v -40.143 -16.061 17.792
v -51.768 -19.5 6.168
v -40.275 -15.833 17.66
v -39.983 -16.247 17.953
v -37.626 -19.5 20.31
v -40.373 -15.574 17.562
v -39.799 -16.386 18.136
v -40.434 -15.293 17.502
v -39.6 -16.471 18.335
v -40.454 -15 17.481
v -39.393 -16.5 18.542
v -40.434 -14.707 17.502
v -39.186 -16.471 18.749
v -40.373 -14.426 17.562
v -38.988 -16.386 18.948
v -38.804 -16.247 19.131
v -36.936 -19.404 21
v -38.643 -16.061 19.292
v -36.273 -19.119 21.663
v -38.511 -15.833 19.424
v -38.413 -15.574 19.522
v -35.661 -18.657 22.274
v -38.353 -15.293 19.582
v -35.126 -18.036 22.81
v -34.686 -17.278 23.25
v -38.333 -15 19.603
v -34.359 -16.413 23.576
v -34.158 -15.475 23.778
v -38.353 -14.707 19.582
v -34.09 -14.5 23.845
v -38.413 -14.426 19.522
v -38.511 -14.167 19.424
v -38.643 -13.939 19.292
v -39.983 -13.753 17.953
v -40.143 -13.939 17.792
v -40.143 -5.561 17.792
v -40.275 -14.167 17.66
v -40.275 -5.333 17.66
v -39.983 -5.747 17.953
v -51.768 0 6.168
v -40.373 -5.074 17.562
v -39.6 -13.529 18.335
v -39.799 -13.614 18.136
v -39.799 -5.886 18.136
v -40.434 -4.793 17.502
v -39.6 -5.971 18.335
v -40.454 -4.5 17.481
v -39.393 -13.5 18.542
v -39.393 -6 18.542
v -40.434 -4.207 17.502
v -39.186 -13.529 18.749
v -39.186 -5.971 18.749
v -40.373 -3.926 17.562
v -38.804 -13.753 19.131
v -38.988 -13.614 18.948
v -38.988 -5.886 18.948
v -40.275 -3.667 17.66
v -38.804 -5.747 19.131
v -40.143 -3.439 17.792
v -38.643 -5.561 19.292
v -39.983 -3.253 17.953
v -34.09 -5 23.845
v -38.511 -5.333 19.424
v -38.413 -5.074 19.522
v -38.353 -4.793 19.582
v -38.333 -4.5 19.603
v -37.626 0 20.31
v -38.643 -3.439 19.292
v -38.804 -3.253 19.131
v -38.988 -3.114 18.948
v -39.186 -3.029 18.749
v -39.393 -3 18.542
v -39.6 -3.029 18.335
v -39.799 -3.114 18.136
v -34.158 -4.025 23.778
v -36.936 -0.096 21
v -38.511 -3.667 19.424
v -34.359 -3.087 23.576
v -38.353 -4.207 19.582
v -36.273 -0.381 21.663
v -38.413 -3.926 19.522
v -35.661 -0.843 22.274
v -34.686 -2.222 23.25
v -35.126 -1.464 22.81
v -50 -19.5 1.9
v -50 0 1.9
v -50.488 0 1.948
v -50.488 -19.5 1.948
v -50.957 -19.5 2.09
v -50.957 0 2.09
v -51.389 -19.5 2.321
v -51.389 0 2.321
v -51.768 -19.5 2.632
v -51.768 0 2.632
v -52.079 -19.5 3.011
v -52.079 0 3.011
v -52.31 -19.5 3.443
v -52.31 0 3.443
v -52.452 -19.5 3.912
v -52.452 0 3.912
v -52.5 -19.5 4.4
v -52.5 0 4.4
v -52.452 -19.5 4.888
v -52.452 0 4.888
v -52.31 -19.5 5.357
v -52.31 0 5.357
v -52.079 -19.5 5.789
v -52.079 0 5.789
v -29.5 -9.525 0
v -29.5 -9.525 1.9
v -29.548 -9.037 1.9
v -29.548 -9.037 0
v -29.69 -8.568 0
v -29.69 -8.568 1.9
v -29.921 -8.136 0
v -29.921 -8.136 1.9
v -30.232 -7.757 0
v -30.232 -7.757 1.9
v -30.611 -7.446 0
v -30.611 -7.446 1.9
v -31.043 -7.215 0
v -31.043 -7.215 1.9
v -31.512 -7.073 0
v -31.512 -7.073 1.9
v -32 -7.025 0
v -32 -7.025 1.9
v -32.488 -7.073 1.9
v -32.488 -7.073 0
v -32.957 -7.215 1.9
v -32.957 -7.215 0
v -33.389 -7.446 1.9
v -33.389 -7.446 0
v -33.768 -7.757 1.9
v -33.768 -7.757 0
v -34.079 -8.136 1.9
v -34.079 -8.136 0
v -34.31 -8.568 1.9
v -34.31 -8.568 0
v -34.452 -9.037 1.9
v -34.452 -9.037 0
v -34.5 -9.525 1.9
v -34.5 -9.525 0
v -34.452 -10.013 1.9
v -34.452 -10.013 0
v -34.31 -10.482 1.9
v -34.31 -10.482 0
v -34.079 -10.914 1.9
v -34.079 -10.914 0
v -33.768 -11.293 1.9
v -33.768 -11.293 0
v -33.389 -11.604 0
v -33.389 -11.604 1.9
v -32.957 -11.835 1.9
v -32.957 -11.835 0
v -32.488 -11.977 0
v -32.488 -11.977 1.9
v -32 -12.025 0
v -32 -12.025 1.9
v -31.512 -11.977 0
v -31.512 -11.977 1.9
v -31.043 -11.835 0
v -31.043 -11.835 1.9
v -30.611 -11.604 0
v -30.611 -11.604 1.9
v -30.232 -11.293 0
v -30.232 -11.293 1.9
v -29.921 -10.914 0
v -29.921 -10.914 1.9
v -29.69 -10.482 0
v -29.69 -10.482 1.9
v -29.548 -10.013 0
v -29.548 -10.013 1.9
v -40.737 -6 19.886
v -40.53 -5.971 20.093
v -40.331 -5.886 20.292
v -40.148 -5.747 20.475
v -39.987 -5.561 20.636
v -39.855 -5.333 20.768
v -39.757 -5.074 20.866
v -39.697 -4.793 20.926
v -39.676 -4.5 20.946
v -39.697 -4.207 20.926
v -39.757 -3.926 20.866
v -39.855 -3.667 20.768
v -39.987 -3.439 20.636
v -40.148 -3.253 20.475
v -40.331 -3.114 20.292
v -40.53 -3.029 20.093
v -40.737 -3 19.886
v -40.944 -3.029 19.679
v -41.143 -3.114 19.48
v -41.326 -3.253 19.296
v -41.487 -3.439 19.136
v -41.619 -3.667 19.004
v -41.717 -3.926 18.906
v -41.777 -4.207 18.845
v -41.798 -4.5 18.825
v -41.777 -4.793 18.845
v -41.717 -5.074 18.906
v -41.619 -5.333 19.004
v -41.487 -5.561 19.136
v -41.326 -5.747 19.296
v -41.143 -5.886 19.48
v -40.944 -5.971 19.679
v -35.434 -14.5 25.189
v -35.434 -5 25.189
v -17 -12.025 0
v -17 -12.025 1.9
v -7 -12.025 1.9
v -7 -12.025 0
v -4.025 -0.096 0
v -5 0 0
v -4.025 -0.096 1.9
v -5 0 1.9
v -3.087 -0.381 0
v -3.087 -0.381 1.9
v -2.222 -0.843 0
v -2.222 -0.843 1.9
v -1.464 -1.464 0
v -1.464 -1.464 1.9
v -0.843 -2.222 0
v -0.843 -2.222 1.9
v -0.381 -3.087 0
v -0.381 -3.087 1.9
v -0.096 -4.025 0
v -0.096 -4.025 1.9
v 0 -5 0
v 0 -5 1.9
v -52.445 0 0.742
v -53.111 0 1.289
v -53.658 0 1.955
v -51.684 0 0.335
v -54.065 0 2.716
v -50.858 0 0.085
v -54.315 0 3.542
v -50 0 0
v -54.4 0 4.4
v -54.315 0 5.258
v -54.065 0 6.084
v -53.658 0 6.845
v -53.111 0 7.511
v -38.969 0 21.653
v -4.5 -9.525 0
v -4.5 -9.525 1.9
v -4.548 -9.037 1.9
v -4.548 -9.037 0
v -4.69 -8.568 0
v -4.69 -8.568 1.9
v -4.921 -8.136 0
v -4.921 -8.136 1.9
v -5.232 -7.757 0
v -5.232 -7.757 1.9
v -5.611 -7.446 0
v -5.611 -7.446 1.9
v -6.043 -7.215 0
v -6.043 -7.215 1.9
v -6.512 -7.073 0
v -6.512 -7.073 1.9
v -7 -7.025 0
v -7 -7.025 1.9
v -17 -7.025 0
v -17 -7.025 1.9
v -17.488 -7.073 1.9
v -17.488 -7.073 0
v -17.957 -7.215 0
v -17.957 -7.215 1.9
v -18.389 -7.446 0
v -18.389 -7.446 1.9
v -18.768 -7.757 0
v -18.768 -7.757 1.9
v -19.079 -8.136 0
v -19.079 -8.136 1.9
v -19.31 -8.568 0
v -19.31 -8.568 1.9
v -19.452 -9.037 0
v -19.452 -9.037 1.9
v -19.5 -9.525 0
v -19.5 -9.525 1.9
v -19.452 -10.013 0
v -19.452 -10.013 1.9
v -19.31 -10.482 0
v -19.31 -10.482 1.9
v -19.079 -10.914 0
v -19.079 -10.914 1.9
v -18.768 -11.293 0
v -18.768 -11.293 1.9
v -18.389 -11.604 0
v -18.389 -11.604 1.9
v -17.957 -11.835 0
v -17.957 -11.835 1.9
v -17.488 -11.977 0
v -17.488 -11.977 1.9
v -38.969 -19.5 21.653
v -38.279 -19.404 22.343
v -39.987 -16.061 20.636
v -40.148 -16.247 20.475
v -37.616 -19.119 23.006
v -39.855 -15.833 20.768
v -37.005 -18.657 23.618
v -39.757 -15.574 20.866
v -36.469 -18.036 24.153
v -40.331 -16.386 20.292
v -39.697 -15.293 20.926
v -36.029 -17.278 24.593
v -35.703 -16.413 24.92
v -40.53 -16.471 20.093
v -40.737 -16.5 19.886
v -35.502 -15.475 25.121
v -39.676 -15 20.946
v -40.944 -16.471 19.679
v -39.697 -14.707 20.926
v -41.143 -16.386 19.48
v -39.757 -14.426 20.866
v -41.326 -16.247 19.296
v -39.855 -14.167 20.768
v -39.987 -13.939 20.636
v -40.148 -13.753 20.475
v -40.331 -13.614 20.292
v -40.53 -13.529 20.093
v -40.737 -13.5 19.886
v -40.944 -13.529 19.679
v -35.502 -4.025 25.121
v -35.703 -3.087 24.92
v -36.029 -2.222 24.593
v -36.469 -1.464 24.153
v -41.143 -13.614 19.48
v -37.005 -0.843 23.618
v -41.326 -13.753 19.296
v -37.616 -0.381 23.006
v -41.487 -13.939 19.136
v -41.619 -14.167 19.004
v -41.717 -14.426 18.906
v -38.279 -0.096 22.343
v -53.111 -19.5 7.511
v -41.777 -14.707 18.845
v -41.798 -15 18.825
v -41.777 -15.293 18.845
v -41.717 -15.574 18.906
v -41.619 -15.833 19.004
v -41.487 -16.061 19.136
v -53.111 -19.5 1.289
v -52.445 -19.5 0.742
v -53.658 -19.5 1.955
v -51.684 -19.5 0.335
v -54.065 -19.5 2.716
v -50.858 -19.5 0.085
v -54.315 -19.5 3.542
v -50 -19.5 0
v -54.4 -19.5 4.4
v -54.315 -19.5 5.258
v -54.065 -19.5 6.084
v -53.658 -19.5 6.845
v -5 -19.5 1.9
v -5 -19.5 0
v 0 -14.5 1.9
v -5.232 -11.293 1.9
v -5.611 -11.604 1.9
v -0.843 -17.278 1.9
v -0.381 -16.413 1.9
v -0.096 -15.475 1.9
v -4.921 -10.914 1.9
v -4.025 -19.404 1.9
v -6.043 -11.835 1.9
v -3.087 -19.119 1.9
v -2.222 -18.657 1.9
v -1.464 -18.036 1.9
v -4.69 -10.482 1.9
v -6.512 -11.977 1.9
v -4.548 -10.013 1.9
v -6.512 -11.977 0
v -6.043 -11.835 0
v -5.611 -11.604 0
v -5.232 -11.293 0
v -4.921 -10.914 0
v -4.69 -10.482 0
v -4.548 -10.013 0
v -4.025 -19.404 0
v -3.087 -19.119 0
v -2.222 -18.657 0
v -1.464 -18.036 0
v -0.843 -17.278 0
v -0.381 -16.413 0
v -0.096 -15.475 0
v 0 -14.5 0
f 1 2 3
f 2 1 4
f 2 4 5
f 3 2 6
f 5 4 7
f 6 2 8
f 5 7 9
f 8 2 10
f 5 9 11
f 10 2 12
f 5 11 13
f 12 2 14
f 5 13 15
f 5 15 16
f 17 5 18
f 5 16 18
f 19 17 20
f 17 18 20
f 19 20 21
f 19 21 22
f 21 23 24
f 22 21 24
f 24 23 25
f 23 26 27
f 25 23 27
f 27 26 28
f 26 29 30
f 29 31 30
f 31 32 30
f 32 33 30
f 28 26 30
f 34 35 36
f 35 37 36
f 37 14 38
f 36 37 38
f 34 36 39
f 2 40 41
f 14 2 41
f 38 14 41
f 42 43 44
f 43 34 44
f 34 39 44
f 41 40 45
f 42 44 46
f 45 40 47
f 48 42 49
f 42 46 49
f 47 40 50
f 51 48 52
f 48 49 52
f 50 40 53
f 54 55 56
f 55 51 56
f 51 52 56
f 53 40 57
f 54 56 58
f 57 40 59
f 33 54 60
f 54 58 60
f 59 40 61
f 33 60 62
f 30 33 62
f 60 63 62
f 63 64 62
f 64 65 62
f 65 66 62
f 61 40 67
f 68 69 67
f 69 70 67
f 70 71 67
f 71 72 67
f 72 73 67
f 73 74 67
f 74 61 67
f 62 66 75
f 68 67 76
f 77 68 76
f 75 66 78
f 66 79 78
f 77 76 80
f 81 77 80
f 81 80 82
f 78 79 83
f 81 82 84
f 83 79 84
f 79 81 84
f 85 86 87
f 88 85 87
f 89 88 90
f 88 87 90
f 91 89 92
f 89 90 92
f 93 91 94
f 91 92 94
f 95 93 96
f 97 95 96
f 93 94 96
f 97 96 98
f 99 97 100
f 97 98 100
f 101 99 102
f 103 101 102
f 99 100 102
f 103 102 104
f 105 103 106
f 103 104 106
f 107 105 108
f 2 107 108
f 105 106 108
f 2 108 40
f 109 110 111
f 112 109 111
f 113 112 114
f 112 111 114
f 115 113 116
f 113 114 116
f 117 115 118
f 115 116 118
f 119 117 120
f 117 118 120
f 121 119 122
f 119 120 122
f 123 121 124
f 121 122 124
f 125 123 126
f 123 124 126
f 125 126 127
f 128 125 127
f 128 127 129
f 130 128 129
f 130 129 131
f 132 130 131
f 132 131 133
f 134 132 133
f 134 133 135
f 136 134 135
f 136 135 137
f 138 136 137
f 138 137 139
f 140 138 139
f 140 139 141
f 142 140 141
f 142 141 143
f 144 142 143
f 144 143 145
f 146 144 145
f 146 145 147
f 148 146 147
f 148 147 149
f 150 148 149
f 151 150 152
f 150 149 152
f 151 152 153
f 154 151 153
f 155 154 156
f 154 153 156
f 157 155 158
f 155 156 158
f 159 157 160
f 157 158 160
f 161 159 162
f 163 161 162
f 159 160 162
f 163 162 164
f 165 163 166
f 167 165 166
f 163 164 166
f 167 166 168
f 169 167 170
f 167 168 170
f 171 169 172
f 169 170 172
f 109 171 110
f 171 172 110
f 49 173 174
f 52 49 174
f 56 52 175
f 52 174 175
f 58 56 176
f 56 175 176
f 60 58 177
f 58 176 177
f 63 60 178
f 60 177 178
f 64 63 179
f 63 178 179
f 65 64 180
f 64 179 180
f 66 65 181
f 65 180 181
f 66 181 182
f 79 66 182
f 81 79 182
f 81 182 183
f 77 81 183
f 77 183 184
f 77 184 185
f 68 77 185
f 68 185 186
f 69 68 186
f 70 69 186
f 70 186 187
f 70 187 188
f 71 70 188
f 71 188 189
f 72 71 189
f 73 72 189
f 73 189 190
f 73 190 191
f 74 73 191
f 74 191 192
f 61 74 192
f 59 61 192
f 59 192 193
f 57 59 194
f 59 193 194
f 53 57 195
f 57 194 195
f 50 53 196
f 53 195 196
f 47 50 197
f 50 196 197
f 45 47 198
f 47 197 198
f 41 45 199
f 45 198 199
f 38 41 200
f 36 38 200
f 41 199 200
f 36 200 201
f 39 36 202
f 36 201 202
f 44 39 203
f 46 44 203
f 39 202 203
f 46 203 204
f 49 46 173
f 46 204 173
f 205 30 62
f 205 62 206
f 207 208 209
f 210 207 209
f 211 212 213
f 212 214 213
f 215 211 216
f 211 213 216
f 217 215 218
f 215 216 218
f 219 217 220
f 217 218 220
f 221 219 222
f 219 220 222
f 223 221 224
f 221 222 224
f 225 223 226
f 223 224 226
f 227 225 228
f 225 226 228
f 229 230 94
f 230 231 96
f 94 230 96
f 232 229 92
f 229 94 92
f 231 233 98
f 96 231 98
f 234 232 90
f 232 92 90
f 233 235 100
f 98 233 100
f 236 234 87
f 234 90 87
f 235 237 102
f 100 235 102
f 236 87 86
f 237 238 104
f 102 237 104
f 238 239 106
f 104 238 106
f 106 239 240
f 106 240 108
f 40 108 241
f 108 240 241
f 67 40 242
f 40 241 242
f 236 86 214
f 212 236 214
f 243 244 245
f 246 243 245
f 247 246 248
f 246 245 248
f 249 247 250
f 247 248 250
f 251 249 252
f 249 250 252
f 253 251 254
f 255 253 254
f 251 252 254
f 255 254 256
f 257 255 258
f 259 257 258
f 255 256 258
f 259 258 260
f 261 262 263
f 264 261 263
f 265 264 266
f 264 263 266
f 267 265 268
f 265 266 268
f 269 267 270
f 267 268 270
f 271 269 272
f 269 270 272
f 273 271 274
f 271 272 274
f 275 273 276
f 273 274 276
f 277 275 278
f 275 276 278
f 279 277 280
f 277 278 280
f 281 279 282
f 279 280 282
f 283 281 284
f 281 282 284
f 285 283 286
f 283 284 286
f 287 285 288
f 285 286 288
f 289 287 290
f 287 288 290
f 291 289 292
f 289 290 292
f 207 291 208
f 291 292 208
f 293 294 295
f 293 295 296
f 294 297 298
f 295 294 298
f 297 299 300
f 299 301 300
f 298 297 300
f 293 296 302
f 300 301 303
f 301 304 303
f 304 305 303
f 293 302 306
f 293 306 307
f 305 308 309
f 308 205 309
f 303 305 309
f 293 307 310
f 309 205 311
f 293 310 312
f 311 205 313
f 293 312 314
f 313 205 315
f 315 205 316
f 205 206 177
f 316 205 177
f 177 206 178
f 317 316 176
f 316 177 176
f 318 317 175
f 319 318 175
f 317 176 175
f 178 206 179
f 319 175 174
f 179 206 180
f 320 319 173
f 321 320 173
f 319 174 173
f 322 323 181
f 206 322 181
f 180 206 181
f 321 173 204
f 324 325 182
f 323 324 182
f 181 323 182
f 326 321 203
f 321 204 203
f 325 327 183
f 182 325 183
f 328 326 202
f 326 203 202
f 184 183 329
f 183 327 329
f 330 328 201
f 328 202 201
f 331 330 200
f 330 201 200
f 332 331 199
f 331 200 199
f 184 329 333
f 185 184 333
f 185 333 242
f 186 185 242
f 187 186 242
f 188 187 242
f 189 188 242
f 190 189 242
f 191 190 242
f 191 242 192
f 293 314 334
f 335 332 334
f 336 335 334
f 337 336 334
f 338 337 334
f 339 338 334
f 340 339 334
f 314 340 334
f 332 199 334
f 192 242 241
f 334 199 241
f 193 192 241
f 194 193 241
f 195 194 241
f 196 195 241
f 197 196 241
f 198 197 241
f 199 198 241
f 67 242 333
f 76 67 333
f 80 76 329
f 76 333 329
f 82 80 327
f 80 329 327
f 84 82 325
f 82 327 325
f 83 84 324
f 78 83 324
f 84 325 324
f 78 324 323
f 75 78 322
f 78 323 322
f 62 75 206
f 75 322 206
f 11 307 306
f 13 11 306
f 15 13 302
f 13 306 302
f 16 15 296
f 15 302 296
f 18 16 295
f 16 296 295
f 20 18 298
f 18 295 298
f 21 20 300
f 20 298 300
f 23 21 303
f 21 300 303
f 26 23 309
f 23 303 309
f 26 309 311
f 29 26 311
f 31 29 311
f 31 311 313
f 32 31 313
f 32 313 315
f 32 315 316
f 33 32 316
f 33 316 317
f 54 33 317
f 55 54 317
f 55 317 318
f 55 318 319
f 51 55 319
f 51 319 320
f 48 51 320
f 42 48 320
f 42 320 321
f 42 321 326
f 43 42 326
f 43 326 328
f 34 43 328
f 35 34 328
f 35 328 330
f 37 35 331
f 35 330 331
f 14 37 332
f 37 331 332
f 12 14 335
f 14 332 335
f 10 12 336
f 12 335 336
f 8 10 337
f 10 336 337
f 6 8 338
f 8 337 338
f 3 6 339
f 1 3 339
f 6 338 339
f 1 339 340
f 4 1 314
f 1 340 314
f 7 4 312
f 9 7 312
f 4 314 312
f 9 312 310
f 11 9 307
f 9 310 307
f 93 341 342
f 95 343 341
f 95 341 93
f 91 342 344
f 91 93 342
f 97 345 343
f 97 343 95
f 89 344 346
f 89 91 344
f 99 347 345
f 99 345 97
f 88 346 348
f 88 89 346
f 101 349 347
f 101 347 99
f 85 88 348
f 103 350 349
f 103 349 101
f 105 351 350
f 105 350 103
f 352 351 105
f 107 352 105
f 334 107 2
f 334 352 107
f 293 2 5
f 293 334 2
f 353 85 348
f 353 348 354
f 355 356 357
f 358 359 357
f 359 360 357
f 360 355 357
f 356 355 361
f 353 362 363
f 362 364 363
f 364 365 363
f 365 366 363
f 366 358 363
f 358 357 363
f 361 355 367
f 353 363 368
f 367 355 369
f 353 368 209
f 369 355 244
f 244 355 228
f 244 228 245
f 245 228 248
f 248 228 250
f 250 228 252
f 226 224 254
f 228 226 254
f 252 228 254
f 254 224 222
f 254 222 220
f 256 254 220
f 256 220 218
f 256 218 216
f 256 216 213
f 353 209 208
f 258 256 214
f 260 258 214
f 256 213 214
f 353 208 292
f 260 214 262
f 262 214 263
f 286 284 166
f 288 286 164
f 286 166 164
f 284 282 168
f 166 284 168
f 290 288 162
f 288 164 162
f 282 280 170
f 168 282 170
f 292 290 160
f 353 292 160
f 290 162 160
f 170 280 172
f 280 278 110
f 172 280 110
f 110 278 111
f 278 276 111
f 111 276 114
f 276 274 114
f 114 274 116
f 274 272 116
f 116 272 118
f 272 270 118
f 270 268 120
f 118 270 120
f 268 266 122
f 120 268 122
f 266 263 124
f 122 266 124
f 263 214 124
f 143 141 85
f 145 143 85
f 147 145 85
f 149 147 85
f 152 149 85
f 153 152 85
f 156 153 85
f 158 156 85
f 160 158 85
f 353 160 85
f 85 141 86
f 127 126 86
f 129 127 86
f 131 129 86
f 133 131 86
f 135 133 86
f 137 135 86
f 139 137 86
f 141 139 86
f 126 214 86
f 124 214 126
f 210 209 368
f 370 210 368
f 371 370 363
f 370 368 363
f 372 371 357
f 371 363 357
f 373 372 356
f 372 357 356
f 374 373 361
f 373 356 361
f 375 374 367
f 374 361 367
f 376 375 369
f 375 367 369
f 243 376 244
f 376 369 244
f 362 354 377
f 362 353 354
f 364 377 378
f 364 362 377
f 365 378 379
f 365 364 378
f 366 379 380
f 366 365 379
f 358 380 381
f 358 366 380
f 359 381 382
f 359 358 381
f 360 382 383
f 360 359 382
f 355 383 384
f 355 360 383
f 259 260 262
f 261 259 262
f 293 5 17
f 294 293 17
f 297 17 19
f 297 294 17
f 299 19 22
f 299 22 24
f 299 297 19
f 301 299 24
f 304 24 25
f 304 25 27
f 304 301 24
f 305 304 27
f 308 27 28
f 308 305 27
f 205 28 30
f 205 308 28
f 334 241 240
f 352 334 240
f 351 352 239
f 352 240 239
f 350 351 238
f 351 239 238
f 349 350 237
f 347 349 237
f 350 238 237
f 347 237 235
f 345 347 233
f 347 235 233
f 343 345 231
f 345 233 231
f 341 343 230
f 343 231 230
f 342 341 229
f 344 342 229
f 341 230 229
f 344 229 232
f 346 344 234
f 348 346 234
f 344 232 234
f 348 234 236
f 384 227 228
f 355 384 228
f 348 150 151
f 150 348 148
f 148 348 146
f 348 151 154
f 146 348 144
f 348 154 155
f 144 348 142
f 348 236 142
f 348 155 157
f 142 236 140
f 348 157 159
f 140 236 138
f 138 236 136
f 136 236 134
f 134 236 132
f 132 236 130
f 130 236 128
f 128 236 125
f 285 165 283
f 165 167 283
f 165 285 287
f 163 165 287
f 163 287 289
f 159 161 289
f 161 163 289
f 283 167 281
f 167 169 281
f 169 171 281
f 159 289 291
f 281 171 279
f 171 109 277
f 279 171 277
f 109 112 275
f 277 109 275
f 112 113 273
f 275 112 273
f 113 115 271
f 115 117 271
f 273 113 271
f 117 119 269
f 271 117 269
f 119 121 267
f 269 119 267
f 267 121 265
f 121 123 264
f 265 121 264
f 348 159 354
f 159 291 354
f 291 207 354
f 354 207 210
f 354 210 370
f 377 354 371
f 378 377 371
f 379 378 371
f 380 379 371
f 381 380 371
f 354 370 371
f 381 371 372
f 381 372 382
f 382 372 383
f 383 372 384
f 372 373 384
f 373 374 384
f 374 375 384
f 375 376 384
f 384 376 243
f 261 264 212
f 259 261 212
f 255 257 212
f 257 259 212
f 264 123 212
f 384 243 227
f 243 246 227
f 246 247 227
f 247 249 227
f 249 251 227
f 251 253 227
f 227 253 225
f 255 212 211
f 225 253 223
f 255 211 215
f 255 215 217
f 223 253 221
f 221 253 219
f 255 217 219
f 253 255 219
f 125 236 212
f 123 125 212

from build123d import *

# Parameters (mm, degrees)
F1_DEPTH = 19.5
F2_R     = 2.5
F3_DEPTH = 25
F4_R     = 1.5
F5_DEPTH = 12
F6_R     = 5


with BuildPart() as f1:
    # F0 (on Front) → F1 (new body)
    with BuildSketch(Plane.XZ):
        with BuildLine():
            Line((-50, 0), (0, 0))
            Line((0, 0), (0, 1.9))
            Line((0, 1.9), (-50, 1.9))
            ThreePointArc((-50, 1.9), (-52.309699, 3.443291), (-51.767767, 6.167767))
            Line((-51.767767, 6.167767), (-34.090097, 23.845436))
            Line((-34.090097, 23.845436), (-35.4336, 25.188939))
            Line((-35.4336, 25.188939), (-53.11127, 7.51127))
            ThreePointArc((-53.11127, 7.51127), (-54.06507, 2.716193), (-50, 0))
        make_face()
    extrude(amount=F1_DEPTH)

    # F2 (on face) → F3 (cut)
    with BuildSketch(Plane.XY.offset(1.9)):
        with BuildLine():
            ThreePointArc((-17, -12.025), (-15.232233, -11.292767), (-14.5, -9.525))
            ThreePointArc((-14.5, -9.525), (-15.232233, -7.757233), (-17, -7.025))
            ThreePointArc((-17, -7.025), (-19.5, -9.525), (-17, -12.025))
        make_face()
        with BuildLine():
            ThreePointArc((-17, -7.025), (-15.232233, -7.757233), (-14.5, -9.525))
            ThreePointArc((-14.5, -9.525), (-15.232233, -11.292767), (-17, -12.025))
            Line((-17, -12.025), (-7, -12.025))
            ThreePointArc((-7, -12.025), (-9.5, -9.525), (-7, -7.025))
            Line((-7, -7.025), (-17, -7.025))
        make_face()
        with BuildLine():
            ThreePointArc((-4.5, -9.525), (-5.232233, -7.757233), (-7, -7.025))
            ThreePointArc((-7, -7.025), (-9.5, -9.525), (-7, -12.025))
            ThreePointArc((-7, -12.025), (-5.232233, -11.292767), (-4.5, -9.525))
        make_face()
        with Locations((-32, -9.525)):
            Circle(F2_R)
    extrude(amount=-F3_DEPTH, mode=Mode.SUBTRACT)

    # F4 (on face) → F5 (cut)
    with BuildSketch(Plane(origin=(-30.31127, 0, 30.31127), x_dir=(0, -1, 0), z_dir=(-0.707107, 0, 0.707107))):
        with Locations((4.5, -14.744069)):
            Circle(F4_R)
        with Locations((15, -14.744069)):
            Circle(F4_R)
    extrude(amount=-F5_DEPTH, mode=Mode.SUBTRACT)

    # F6
    f6_edges = [f1.edges().sort_by_distance(p)[0] for p in [
        (-34.761849, 0, 24.517188),
        (-34.761849, -19.5, 24.517188),
        (0, -19.5, 0.95),
        (0, 0, 0.95),
    ]]
    fillet(f6_edges, radius=F6_R)


solid = f1.part
